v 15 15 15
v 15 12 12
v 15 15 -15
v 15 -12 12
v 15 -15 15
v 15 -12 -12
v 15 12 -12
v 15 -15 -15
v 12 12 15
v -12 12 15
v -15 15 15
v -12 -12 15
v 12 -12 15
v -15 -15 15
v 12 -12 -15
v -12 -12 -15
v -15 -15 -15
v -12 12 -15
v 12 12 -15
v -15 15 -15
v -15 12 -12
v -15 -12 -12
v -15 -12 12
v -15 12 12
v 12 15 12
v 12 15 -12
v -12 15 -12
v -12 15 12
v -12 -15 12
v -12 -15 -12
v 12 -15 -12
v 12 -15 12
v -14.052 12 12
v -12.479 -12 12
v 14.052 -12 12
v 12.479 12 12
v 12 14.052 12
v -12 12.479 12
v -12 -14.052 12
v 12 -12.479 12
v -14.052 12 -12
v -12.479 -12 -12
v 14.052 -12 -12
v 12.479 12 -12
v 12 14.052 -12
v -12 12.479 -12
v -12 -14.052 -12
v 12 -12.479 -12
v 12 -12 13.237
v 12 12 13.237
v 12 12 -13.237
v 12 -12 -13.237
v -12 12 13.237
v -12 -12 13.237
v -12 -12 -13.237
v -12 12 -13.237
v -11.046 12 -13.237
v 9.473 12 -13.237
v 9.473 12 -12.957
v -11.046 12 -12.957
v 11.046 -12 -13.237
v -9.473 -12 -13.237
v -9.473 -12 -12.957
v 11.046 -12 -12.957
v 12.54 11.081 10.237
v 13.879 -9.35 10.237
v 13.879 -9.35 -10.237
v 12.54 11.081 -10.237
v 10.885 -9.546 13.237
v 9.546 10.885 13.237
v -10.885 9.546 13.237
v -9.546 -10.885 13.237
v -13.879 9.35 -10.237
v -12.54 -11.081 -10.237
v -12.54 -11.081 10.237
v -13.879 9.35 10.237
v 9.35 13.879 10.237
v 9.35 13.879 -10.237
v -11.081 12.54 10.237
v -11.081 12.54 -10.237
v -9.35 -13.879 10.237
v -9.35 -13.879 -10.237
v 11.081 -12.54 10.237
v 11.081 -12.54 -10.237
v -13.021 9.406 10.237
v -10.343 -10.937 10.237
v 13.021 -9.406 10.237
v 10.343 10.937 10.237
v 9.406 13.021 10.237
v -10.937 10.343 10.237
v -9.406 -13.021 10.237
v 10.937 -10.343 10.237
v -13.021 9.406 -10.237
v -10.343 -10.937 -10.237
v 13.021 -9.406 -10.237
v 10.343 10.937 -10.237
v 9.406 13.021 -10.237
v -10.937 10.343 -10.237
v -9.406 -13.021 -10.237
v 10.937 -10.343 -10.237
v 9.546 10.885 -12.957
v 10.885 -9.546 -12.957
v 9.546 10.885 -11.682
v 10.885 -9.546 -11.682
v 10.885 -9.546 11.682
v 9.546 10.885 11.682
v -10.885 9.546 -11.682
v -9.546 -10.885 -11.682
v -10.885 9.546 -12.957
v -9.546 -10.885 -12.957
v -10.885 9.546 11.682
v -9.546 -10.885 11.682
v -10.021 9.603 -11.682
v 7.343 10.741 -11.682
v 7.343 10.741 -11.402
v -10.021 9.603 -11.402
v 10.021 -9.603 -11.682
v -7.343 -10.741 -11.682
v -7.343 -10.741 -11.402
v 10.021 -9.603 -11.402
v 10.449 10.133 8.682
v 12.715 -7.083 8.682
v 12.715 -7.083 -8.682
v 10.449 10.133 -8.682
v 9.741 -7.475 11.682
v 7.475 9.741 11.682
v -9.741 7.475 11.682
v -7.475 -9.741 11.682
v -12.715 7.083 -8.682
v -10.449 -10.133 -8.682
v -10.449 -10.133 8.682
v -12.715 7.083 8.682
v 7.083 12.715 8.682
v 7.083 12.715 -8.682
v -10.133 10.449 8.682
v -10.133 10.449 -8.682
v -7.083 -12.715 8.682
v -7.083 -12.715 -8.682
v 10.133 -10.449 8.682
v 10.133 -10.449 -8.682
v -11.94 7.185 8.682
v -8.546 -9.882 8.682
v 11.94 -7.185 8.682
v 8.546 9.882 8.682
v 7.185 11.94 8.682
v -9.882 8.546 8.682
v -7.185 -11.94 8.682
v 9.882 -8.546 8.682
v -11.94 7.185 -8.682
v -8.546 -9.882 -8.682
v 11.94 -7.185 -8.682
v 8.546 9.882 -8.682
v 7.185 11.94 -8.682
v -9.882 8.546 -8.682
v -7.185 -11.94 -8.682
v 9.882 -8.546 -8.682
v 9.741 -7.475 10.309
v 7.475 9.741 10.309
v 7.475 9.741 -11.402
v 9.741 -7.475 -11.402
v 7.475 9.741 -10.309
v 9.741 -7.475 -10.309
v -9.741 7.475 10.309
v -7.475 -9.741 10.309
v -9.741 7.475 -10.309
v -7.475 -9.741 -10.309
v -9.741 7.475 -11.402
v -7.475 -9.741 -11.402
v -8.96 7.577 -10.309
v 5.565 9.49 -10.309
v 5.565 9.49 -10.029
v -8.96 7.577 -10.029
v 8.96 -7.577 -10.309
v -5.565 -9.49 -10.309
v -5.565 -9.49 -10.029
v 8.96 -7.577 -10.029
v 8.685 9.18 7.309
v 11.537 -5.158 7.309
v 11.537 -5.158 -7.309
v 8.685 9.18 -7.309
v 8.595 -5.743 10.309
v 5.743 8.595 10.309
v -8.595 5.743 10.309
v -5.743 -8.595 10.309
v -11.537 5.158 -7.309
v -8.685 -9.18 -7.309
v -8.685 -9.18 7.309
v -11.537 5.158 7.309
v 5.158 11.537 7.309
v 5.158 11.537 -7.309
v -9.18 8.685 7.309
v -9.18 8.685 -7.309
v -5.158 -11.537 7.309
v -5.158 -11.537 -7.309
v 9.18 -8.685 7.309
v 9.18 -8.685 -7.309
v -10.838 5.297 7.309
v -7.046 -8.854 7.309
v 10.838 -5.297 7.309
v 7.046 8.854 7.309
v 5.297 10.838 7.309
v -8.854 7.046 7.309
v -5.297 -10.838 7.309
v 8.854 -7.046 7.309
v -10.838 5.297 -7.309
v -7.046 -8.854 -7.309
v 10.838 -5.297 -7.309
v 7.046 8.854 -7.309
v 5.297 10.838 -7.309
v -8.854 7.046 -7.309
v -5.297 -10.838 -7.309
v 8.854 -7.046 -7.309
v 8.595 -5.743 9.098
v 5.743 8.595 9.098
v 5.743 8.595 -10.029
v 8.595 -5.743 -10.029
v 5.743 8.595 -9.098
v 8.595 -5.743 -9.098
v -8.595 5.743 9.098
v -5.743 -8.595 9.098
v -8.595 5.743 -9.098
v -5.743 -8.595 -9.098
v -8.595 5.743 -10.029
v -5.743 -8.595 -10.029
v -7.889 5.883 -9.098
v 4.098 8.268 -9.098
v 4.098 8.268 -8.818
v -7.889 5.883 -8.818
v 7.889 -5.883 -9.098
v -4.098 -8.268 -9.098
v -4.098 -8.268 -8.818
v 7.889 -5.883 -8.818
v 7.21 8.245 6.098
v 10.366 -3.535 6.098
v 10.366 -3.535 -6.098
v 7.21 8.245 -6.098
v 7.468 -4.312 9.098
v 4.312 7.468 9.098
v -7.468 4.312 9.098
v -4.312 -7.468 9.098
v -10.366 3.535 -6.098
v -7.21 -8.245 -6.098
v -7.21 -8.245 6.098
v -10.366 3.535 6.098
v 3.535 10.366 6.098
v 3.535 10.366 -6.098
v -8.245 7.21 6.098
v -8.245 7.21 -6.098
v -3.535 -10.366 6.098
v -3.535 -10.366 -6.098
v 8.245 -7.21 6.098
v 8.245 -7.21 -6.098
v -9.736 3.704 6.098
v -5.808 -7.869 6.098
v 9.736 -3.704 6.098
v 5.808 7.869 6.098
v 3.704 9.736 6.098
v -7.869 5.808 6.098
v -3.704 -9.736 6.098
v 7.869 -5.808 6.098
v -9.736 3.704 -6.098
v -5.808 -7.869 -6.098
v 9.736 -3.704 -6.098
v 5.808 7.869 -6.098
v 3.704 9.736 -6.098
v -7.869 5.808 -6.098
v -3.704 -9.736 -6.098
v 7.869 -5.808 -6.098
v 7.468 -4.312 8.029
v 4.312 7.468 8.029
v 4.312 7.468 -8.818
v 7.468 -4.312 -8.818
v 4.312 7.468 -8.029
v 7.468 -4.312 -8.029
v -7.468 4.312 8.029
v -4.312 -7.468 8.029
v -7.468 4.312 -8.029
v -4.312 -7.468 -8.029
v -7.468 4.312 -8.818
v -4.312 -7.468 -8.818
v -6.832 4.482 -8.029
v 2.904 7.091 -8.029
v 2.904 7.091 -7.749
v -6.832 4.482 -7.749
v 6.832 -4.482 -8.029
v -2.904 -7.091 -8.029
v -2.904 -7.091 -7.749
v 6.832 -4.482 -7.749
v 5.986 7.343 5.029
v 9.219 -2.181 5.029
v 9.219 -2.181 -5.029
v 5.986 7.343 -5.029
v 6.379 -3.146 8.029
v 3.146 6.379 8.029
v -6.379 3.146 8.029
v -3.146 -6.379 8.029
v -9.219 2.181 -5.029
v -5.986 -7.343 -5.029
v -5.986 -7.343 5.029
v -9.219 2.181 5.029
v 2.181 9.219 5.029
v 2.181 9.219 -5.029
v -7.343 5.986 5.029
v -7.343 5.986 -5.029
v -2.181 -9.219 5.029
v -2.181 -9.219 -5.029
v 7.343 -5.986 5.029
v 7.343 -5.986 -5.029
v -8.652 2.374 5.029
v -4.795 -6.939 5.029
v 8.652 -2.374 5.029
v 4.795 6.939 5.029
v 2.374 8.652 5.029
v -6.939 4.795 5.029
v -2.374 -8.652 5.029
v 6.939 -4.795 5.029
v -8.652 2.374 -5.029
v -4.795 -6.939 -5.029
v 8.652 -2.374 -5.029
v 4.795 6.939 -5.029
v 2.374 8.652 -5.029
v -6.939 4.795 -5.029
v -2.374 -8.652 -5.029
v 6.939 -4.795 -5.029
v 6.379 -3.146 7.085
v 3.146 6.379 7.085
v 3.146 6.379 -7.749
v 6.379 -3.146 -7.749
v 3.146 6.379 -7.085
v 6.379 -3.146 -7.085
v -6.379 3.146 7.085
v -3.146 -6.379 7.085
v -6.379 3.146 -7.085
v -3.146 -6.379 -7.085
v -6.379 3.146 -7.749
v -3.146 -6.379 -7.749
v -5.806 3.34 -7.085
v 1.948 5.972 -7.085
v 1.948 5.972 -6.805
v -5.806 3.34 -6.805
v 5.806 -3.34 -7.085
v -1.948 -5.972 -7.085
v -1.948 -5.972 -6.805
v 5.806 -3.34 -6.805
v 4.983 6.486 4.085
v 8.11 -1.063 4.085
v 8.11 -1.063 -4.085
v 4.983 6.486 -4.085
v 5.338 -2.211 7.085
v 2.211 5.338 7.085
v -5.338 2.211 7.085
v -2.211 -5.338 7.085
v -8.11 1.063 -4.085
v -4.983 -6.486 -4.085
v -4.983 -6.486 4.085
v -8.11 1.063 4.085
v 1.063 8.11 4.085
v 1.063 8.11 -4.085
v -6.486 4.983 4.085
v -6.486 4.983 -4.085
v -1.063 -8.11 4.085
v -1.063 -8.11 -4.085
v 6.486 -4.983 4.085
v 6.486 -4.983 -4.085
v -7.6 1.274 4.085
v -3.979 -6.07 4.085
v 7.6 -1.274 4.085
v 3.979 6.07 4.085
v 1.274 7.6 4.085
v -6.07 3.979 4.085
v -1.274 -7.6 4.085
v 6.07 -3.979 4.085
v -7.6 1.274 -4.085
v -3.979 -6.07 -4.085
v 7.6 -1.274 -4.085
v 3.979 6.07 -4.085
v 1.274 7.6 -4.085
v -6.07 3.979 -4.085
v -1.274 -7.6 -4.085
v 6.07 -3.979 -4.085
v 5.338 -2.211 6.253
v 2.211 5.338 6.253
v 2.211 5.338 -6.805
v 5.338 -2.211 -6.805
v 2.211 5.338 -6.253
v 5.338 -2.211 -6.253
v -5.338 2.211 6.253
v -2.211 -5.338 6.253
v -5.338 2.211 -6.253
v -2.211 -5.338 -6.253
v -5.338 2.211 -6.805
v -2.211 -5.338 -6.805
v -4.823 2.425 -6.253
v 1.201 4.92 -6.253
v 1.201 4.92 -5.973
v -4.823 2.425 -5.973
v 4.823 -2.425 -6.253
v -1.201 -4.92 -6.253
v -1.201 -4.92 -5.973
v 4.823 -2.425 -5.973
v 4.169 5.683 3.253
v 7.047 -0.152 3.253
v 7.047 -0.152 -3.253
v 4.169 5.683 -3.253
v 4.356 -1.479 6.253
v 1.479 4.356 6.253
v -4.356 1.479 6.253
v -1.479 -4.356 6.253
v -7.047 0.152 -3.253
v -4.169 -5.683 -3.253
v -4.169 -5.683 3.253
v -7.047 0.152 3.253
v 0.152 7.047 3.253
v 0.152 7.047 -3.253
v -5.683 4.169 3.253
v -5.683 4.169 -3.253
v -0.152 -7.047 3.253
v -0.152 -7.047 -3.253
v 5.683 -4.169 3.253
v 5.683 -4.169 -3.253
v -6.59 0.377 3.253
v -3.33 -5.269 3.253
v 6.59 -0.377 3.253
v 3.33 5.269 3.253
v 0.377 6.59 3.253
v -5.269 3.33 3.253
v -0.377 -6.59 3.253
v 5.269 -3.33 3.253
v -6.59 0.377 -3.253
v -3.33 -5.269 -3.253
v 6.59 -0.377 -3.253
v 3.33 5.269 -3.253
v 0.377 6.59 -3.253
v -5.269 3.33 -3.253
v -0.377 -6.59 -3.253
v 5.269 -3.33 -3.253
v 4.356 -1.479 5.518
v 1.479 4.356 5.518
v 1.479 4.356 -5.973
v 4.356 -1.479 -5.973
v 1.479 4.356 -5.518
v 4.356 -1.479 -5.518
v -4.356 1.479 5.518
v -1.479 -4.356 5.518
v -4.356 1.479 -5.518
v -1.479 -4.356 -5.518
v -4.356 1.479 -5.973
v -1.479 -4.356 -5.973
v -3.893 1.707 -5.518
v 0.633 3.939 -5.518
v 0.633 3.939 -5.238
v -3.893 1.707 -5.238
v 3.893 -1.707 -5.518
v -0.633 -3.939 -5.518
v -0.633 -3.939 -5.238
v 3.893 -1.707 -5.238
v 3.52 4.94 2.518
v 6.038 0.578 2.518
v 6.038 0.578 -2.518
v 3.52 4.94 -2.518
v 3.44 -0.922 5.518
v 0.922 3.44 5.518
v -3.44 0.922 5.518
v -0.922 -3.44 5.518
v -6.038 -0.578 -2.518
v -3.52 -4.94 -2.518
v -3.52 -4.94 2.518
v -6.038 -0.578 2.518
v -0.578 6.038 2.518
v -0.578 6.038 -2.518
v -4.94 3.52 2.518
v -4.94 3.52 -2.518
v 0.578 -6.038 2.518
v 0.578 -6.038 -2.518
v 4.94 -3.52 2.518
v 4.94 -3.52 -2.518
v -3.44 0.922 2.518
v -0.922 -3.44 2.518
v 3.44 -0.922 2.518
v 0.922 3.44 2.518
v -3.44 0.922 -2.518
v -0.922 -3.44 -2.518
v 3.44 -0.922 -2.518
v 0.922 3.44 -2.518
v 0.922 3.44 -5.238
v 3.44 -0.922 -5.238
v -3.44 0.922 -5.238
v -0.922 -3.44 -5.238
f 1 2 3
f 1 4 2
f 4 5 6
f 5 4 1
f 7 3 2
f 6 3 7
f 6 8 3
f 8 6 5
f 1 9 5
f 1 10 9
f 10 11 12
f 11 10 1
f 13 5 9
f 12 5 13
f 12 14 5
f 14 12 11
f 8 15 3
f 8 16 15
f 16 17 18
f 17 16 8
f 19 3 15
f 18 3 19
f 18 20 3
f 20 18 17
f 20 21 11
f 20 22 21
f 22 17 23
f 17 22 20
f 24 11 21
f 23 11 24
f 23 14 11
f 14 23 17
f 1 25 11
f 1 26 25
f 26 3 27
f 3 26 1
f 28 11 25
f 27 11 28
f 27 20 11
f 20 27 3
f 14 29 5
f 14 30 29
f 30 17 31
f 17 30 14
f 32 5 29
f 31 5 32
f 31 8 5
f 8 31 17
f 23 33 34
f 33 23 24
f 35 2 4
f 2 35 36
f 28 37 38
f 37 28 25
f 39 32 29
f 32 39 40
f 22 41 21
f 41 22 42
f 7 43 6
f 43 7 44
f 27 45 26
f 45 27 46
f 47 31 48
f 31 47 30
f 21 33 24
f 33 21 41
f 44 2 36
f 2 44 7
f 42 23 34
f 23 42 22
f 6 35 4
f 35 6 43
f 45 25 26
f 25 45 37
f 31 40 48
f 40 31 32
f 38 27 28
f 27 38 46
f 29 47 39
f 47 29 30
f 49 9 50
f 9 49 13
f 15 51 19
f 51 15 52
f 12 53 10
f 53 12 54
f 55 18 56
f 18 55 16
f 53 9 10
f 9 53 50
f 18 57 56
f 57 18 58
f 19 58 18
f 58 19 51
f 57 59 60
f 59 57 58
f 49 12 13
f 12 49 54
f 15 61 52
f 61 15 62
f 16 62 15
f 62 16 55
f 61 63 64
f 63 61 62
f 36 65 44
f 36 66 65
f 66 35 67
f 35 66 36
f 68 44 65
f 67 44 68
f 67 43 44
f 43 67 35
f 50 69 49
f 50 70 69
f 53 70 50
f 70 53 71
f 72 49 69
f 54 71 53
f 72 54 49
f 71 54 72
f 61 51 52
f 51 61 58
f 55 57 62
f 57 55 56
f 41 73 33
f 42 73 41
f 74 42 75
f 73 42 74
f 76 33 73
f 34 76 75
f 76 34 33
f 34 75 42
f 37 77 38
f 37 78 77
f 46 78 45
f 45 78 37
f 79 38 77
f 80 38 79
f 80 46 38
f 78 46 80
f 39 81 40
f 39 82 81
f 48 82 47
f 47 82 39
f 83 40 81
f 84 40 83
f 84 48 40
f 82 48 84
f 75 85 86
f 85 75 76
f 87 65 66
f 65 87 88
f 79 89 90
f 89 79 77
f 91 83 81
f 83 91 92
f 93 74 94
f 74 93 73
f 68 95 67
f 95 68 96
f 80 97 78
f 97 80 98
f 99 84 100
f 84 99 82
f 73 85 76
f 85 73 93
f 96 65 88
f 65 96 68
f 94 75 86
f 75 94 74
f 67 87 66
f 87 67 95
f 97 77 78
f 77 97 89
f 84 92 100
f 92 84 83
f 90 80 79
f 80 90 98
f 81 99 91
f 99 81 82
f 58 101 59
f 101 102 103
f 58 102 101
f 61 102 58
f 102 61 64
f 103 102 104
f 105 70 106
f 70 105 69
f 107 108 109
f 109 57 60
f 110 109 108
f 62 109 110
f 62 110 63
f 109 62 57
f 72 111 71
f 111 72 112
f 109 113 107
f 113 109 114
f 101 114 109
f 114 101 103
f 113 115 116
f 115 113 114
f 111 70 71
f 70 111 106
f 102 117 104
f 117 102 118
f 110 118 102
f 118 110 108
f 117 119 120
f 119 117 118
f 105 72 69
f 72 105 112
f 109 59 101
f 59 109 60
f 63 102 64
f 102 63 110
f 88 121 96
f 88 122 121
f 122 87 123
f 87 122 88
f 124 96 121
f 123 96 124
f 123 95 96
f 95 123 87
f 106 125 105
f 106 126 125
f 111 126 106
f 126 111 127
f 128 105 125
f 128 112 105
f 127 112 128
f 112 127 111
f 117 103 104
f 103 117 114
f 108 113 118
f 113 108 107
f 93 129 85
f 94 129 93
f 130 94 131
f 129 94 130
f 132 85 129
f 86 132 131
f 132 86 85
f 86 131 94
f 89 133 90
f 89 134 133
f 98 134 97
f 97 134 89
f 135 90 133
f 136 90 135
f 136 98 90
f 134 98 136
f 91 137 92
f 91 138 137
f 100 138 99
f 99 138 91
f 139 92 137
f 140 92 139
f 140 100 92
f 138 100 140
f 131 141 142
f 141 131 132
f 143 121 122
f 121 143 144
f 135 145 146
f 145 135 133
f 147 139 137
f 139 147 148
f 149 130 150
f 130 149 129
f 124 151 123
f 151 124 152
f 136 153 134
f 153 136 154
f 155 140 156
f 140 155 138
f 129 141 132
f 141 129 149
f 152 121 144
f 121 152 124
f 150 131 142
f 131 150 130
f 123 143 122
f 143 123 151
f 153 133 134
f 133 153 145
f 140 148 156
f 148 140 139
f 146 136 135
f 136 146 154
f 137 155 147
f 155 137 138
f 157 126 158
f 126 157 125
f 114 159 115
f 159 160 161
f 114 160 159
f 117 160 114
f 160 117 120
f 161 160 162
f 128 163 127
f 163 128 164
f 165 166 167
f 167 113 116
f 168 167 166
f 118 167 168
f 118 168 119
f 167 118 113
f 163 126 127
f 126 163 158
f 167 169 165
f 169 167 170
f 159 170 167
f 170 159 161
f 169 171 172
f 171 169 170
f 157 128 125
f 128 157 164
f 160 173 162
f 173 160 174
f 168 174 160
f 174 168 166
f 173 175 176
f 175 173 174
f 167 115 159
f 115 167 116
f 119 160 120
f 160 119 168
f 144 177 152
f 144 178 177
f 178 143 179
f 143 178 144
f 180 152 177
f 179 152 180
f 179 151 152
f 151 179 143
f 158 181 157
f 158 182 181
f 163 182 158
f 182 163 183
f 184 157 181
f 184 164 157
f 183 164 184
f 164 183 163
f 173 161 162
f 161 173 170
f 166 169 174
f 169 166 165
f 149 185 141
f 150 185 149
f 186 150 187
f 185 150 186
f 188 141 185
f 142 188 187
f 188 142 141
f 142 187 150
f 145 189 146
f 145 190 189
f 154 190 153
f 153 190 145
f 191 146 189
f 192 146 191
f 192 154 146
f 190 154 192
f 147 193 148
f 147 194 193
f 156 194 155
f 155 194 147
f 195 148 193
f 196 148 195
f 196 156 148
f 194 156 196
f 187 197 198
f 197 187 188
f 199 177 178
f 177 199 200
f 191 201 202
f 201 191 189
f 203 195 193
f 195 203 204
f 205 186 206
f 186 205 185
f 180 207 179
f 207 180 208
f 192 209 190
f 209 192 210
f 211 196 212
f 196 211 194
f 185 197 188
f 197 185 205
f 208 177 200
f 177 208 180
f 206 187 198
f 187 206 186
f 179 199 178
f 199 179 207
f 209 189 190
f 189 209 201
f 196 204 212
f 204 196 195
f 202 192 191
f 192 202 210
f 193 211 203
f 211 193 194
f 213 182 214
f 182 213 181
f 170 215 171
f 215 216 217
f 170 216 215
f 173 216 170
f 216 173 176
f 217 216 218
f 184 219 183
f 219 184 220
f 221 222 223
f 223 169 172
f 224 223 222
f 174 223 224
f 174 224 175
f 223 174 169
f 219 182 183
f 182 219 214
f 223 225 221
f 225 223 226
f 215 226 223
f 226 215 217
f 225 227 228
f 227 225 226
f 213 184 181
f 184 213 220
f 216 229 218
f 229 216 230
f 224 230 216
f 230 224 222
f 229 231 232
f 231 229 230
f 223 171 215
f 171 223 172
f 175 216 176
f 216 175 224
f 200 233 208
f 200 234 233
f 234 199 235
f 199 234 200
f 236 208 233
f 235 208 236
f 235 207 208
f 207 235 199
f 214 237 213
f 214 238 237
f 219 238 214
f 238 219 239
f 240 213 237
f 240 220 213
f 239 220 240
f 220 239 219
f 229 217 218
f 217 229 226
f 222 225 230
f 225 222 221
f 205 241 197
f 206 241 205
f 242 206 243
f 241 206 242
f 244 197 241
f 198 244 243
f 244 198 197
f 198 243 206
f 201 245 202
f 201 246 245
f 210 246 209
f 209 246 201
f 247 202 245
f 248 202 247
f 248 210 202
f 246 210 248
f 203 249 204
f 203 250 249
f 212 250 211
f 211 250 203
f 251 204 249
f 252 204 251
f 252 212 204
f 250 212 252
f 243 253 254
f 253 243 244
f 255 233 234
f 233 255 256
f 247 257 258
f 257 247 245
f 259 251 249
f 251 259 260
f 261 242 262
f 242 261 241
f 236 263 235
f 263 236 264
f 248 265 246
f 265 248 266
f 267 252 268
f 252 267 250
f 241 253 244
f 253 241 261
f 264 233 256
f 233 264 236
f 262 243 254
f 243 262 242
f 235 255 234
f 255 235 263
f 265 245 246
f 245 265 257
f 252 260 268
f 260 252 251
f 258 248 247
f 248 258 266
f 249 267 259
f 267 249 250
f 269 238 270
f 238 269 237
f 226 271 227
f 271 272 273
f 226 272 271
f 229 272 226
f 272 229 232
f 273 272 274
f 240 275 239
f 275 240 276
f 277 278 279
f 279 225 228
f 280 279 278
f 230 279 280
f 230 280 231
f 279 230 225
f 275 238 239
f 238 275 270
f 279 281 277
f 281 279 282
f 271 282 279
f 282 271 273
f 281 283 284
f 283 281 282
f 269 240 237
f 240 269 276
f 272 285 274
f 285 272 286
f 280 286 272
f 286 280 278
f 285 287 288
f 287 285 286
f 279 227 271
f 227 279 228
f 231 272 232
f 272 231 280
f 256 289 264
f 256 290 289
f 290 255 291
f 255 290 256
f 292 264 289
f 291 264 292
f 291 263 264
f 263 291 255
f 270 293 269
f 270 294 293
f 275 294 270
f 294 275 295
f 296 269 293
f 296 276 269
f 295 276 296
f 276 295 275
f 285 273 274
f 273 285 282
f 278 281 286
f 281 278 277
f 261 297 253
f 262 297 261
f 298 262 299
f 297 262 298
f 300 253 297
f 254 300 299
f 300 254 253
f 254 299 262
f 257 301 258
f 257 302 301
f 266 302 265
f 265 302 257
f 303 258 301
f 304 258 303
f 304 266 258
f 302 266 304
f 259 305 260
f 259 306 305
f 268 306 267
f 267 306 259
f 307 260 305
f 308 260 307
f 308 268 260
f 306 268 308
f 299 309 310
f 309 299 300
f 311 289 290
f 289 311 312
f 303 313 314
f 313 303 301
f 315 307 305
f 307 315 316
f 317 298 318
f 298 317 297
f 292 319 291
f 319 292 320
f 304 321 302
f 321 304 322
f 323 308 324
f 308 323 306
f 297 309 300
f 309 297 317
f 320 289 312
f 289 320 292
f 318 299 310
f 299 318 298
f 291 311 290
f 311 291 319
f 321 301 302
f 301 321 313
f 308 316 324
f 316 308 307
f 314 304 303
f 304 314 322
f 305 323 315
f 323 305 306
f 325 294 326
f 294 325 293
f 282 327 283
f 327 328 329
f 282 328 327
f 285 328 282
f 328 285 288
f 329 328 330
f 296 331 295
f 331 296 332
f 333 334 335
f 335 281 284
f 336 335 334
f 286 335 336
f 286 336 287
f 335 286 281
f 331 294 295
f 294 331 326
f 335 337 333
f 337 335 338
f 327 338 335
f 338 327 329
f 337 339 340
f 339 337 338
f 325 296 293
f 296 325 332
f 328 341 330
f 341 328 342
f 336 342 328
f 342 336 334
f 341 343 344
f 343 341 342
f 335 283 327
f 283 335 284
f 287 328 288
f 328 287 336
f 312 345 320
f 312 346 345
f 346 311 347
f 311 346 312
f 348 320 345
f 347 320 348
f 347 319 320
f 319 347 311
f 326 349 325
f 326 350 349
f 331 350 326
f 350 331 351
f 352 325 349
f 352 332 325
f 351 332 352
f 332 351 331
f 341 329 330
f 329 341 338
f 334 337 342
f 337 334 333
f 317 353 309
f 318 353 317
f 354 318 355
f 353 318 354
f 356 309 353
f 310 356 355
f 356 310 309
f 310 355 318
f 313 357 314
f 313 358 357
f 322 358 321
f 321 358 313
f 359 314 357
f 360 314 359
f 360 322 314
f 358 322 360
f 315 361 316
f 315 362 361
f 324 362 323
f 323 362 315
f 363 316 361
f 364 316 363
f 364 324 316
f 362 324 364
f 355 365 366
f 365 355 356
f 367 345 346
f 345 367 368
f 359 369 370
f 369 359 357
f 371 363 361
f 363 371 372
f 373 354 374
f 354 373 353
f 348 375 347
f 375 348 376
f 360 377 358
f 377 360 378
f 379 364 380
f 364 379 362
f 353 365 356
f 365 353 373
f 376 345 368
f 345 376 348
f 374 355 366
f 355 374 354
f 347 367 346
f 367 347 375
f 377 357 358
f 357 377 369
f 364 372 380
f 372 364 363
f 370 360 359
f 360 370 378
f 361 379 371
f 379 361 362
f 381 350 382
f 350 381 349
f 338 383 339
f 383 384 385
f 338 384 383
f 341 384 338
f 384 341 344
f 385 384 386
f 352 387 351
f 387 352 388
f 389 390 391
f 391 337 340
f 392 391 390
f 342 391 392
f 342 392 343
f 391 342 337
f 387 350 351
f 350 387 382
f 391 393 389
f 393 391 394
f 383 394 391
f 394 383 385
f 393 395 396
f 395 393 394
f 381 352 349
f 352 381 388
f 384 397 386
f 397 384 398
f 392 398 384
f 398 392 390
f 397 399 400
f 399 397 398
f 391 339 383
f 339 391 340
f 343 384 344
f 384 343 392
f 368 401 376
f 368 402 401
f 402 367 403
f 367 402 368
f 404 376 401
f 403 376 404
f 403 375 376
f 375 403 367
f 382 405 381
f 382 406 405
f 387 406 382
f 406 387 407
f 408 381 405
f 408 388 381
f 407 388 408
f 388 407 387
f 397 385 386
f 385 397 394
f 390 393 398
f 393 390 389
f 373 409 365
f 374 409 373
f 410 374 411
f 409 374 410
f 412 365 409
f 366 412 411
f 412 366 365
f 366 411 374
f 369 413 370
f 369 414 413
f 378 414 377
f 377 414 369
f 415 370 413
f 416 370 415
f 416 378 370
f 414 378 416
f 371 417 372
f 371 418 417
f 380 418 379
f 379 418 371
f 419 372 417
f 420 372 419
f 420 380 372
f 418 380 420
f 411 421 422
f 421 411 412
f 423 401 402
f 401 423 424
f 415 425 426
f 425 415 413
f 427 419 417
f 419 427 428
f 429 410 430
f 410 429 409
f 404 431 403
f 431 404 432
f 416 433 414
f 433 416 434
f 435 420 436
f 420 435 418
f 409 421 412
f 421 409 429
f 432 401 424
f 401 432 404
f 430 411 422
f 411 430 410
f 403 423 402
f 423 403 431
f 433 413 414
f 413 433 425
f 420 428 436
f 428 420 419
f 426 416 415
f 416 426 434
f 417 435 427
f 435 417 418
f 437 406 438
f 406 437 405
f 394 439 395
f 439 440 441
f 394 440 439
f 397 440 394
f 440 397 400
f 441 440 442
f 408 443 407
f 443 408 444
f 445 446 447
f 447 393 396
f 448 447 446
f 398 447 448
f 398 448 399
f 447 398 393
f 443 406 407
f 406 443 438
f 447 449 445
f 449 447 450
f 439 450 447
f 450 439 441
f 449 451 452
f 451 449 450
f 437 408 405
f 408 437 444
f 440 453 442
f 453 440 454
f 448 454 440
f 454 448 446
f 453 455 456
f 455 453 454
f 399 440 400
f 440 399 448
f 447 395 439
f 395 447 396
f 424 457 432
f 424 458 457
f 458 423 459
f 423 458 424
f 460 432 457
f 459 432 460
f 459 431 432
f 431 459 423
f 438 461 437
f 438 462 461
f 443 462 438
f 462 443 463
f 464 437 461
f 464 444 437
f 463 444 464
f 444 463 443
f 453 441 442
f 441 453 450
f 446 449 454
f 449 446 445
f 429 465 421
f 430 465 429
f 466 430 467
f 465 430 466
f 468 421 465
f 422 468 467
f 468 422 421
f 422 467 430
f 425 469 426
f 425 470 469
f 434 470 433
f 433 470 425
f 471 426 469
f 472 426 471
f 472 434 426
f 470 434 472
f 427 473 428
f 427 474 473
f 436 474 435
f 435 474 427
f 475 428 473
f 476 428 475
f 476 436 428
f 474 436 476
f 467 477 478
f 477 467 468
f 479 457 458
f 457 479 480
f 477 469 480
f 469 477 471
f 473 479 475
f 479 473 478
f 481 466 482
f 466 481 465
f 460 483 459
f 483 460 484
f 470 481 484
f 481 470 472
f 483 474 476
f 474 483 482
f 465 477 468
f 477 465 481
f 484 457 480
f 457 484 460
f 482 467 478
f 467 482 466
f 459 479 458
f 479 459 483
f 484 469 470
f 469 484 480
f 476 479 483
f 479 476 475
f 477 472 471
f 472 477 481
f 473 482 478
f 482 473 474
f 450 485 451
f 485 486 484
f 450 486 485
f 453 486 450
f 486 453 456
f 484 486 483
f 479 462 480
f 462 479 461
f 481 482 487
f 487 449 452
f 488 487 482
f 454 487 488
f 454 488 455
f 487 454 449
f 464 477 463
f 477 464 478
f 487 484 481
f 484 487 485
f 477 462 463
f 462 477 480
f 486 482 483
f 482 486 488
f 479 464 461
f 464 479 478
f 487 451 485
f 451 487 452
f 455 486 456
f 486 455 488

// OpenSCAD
// Spiral Cube by P. Bauermeister, January 2018
// See https://www.instructables.com/id/OpenSCAD-Tutorial-Spiral-Cube/

WALL_THICKNESS = 3;
SIZE = 30;
STEPS = 8;
TOTAL_ROTATION = 30;
LAYER = 0.28;

module make_cube_edges(size, rotation, must_etch_base) {
    d1 = size - WALL_THICKNESS*2; // to keep walls
    d2 = size + WALL_THICKNESS; // to dig face
    rotate([0, 0, rotation])
    difference() {
        cube([size, size, size], true); // full cube
        cube([d2, d1, d1], true); // dig along X axis
        cube([d1, d2, d1], true); // dig along Y axis
        cube([d1, d1, d2], true); // dig along Z axis
        
        if (must_etch_base) {
            translate([0, 0, -size/2])
            cube([d1, d2, LAYER*2], true); // dig along Z axis
        }
    }
}

for (i=[0:STEPS]) {
    make_cube_edges(SIZE / exp(i/STEPS), i/STEPS * TOTAL_ROTATION, i>0);
}
